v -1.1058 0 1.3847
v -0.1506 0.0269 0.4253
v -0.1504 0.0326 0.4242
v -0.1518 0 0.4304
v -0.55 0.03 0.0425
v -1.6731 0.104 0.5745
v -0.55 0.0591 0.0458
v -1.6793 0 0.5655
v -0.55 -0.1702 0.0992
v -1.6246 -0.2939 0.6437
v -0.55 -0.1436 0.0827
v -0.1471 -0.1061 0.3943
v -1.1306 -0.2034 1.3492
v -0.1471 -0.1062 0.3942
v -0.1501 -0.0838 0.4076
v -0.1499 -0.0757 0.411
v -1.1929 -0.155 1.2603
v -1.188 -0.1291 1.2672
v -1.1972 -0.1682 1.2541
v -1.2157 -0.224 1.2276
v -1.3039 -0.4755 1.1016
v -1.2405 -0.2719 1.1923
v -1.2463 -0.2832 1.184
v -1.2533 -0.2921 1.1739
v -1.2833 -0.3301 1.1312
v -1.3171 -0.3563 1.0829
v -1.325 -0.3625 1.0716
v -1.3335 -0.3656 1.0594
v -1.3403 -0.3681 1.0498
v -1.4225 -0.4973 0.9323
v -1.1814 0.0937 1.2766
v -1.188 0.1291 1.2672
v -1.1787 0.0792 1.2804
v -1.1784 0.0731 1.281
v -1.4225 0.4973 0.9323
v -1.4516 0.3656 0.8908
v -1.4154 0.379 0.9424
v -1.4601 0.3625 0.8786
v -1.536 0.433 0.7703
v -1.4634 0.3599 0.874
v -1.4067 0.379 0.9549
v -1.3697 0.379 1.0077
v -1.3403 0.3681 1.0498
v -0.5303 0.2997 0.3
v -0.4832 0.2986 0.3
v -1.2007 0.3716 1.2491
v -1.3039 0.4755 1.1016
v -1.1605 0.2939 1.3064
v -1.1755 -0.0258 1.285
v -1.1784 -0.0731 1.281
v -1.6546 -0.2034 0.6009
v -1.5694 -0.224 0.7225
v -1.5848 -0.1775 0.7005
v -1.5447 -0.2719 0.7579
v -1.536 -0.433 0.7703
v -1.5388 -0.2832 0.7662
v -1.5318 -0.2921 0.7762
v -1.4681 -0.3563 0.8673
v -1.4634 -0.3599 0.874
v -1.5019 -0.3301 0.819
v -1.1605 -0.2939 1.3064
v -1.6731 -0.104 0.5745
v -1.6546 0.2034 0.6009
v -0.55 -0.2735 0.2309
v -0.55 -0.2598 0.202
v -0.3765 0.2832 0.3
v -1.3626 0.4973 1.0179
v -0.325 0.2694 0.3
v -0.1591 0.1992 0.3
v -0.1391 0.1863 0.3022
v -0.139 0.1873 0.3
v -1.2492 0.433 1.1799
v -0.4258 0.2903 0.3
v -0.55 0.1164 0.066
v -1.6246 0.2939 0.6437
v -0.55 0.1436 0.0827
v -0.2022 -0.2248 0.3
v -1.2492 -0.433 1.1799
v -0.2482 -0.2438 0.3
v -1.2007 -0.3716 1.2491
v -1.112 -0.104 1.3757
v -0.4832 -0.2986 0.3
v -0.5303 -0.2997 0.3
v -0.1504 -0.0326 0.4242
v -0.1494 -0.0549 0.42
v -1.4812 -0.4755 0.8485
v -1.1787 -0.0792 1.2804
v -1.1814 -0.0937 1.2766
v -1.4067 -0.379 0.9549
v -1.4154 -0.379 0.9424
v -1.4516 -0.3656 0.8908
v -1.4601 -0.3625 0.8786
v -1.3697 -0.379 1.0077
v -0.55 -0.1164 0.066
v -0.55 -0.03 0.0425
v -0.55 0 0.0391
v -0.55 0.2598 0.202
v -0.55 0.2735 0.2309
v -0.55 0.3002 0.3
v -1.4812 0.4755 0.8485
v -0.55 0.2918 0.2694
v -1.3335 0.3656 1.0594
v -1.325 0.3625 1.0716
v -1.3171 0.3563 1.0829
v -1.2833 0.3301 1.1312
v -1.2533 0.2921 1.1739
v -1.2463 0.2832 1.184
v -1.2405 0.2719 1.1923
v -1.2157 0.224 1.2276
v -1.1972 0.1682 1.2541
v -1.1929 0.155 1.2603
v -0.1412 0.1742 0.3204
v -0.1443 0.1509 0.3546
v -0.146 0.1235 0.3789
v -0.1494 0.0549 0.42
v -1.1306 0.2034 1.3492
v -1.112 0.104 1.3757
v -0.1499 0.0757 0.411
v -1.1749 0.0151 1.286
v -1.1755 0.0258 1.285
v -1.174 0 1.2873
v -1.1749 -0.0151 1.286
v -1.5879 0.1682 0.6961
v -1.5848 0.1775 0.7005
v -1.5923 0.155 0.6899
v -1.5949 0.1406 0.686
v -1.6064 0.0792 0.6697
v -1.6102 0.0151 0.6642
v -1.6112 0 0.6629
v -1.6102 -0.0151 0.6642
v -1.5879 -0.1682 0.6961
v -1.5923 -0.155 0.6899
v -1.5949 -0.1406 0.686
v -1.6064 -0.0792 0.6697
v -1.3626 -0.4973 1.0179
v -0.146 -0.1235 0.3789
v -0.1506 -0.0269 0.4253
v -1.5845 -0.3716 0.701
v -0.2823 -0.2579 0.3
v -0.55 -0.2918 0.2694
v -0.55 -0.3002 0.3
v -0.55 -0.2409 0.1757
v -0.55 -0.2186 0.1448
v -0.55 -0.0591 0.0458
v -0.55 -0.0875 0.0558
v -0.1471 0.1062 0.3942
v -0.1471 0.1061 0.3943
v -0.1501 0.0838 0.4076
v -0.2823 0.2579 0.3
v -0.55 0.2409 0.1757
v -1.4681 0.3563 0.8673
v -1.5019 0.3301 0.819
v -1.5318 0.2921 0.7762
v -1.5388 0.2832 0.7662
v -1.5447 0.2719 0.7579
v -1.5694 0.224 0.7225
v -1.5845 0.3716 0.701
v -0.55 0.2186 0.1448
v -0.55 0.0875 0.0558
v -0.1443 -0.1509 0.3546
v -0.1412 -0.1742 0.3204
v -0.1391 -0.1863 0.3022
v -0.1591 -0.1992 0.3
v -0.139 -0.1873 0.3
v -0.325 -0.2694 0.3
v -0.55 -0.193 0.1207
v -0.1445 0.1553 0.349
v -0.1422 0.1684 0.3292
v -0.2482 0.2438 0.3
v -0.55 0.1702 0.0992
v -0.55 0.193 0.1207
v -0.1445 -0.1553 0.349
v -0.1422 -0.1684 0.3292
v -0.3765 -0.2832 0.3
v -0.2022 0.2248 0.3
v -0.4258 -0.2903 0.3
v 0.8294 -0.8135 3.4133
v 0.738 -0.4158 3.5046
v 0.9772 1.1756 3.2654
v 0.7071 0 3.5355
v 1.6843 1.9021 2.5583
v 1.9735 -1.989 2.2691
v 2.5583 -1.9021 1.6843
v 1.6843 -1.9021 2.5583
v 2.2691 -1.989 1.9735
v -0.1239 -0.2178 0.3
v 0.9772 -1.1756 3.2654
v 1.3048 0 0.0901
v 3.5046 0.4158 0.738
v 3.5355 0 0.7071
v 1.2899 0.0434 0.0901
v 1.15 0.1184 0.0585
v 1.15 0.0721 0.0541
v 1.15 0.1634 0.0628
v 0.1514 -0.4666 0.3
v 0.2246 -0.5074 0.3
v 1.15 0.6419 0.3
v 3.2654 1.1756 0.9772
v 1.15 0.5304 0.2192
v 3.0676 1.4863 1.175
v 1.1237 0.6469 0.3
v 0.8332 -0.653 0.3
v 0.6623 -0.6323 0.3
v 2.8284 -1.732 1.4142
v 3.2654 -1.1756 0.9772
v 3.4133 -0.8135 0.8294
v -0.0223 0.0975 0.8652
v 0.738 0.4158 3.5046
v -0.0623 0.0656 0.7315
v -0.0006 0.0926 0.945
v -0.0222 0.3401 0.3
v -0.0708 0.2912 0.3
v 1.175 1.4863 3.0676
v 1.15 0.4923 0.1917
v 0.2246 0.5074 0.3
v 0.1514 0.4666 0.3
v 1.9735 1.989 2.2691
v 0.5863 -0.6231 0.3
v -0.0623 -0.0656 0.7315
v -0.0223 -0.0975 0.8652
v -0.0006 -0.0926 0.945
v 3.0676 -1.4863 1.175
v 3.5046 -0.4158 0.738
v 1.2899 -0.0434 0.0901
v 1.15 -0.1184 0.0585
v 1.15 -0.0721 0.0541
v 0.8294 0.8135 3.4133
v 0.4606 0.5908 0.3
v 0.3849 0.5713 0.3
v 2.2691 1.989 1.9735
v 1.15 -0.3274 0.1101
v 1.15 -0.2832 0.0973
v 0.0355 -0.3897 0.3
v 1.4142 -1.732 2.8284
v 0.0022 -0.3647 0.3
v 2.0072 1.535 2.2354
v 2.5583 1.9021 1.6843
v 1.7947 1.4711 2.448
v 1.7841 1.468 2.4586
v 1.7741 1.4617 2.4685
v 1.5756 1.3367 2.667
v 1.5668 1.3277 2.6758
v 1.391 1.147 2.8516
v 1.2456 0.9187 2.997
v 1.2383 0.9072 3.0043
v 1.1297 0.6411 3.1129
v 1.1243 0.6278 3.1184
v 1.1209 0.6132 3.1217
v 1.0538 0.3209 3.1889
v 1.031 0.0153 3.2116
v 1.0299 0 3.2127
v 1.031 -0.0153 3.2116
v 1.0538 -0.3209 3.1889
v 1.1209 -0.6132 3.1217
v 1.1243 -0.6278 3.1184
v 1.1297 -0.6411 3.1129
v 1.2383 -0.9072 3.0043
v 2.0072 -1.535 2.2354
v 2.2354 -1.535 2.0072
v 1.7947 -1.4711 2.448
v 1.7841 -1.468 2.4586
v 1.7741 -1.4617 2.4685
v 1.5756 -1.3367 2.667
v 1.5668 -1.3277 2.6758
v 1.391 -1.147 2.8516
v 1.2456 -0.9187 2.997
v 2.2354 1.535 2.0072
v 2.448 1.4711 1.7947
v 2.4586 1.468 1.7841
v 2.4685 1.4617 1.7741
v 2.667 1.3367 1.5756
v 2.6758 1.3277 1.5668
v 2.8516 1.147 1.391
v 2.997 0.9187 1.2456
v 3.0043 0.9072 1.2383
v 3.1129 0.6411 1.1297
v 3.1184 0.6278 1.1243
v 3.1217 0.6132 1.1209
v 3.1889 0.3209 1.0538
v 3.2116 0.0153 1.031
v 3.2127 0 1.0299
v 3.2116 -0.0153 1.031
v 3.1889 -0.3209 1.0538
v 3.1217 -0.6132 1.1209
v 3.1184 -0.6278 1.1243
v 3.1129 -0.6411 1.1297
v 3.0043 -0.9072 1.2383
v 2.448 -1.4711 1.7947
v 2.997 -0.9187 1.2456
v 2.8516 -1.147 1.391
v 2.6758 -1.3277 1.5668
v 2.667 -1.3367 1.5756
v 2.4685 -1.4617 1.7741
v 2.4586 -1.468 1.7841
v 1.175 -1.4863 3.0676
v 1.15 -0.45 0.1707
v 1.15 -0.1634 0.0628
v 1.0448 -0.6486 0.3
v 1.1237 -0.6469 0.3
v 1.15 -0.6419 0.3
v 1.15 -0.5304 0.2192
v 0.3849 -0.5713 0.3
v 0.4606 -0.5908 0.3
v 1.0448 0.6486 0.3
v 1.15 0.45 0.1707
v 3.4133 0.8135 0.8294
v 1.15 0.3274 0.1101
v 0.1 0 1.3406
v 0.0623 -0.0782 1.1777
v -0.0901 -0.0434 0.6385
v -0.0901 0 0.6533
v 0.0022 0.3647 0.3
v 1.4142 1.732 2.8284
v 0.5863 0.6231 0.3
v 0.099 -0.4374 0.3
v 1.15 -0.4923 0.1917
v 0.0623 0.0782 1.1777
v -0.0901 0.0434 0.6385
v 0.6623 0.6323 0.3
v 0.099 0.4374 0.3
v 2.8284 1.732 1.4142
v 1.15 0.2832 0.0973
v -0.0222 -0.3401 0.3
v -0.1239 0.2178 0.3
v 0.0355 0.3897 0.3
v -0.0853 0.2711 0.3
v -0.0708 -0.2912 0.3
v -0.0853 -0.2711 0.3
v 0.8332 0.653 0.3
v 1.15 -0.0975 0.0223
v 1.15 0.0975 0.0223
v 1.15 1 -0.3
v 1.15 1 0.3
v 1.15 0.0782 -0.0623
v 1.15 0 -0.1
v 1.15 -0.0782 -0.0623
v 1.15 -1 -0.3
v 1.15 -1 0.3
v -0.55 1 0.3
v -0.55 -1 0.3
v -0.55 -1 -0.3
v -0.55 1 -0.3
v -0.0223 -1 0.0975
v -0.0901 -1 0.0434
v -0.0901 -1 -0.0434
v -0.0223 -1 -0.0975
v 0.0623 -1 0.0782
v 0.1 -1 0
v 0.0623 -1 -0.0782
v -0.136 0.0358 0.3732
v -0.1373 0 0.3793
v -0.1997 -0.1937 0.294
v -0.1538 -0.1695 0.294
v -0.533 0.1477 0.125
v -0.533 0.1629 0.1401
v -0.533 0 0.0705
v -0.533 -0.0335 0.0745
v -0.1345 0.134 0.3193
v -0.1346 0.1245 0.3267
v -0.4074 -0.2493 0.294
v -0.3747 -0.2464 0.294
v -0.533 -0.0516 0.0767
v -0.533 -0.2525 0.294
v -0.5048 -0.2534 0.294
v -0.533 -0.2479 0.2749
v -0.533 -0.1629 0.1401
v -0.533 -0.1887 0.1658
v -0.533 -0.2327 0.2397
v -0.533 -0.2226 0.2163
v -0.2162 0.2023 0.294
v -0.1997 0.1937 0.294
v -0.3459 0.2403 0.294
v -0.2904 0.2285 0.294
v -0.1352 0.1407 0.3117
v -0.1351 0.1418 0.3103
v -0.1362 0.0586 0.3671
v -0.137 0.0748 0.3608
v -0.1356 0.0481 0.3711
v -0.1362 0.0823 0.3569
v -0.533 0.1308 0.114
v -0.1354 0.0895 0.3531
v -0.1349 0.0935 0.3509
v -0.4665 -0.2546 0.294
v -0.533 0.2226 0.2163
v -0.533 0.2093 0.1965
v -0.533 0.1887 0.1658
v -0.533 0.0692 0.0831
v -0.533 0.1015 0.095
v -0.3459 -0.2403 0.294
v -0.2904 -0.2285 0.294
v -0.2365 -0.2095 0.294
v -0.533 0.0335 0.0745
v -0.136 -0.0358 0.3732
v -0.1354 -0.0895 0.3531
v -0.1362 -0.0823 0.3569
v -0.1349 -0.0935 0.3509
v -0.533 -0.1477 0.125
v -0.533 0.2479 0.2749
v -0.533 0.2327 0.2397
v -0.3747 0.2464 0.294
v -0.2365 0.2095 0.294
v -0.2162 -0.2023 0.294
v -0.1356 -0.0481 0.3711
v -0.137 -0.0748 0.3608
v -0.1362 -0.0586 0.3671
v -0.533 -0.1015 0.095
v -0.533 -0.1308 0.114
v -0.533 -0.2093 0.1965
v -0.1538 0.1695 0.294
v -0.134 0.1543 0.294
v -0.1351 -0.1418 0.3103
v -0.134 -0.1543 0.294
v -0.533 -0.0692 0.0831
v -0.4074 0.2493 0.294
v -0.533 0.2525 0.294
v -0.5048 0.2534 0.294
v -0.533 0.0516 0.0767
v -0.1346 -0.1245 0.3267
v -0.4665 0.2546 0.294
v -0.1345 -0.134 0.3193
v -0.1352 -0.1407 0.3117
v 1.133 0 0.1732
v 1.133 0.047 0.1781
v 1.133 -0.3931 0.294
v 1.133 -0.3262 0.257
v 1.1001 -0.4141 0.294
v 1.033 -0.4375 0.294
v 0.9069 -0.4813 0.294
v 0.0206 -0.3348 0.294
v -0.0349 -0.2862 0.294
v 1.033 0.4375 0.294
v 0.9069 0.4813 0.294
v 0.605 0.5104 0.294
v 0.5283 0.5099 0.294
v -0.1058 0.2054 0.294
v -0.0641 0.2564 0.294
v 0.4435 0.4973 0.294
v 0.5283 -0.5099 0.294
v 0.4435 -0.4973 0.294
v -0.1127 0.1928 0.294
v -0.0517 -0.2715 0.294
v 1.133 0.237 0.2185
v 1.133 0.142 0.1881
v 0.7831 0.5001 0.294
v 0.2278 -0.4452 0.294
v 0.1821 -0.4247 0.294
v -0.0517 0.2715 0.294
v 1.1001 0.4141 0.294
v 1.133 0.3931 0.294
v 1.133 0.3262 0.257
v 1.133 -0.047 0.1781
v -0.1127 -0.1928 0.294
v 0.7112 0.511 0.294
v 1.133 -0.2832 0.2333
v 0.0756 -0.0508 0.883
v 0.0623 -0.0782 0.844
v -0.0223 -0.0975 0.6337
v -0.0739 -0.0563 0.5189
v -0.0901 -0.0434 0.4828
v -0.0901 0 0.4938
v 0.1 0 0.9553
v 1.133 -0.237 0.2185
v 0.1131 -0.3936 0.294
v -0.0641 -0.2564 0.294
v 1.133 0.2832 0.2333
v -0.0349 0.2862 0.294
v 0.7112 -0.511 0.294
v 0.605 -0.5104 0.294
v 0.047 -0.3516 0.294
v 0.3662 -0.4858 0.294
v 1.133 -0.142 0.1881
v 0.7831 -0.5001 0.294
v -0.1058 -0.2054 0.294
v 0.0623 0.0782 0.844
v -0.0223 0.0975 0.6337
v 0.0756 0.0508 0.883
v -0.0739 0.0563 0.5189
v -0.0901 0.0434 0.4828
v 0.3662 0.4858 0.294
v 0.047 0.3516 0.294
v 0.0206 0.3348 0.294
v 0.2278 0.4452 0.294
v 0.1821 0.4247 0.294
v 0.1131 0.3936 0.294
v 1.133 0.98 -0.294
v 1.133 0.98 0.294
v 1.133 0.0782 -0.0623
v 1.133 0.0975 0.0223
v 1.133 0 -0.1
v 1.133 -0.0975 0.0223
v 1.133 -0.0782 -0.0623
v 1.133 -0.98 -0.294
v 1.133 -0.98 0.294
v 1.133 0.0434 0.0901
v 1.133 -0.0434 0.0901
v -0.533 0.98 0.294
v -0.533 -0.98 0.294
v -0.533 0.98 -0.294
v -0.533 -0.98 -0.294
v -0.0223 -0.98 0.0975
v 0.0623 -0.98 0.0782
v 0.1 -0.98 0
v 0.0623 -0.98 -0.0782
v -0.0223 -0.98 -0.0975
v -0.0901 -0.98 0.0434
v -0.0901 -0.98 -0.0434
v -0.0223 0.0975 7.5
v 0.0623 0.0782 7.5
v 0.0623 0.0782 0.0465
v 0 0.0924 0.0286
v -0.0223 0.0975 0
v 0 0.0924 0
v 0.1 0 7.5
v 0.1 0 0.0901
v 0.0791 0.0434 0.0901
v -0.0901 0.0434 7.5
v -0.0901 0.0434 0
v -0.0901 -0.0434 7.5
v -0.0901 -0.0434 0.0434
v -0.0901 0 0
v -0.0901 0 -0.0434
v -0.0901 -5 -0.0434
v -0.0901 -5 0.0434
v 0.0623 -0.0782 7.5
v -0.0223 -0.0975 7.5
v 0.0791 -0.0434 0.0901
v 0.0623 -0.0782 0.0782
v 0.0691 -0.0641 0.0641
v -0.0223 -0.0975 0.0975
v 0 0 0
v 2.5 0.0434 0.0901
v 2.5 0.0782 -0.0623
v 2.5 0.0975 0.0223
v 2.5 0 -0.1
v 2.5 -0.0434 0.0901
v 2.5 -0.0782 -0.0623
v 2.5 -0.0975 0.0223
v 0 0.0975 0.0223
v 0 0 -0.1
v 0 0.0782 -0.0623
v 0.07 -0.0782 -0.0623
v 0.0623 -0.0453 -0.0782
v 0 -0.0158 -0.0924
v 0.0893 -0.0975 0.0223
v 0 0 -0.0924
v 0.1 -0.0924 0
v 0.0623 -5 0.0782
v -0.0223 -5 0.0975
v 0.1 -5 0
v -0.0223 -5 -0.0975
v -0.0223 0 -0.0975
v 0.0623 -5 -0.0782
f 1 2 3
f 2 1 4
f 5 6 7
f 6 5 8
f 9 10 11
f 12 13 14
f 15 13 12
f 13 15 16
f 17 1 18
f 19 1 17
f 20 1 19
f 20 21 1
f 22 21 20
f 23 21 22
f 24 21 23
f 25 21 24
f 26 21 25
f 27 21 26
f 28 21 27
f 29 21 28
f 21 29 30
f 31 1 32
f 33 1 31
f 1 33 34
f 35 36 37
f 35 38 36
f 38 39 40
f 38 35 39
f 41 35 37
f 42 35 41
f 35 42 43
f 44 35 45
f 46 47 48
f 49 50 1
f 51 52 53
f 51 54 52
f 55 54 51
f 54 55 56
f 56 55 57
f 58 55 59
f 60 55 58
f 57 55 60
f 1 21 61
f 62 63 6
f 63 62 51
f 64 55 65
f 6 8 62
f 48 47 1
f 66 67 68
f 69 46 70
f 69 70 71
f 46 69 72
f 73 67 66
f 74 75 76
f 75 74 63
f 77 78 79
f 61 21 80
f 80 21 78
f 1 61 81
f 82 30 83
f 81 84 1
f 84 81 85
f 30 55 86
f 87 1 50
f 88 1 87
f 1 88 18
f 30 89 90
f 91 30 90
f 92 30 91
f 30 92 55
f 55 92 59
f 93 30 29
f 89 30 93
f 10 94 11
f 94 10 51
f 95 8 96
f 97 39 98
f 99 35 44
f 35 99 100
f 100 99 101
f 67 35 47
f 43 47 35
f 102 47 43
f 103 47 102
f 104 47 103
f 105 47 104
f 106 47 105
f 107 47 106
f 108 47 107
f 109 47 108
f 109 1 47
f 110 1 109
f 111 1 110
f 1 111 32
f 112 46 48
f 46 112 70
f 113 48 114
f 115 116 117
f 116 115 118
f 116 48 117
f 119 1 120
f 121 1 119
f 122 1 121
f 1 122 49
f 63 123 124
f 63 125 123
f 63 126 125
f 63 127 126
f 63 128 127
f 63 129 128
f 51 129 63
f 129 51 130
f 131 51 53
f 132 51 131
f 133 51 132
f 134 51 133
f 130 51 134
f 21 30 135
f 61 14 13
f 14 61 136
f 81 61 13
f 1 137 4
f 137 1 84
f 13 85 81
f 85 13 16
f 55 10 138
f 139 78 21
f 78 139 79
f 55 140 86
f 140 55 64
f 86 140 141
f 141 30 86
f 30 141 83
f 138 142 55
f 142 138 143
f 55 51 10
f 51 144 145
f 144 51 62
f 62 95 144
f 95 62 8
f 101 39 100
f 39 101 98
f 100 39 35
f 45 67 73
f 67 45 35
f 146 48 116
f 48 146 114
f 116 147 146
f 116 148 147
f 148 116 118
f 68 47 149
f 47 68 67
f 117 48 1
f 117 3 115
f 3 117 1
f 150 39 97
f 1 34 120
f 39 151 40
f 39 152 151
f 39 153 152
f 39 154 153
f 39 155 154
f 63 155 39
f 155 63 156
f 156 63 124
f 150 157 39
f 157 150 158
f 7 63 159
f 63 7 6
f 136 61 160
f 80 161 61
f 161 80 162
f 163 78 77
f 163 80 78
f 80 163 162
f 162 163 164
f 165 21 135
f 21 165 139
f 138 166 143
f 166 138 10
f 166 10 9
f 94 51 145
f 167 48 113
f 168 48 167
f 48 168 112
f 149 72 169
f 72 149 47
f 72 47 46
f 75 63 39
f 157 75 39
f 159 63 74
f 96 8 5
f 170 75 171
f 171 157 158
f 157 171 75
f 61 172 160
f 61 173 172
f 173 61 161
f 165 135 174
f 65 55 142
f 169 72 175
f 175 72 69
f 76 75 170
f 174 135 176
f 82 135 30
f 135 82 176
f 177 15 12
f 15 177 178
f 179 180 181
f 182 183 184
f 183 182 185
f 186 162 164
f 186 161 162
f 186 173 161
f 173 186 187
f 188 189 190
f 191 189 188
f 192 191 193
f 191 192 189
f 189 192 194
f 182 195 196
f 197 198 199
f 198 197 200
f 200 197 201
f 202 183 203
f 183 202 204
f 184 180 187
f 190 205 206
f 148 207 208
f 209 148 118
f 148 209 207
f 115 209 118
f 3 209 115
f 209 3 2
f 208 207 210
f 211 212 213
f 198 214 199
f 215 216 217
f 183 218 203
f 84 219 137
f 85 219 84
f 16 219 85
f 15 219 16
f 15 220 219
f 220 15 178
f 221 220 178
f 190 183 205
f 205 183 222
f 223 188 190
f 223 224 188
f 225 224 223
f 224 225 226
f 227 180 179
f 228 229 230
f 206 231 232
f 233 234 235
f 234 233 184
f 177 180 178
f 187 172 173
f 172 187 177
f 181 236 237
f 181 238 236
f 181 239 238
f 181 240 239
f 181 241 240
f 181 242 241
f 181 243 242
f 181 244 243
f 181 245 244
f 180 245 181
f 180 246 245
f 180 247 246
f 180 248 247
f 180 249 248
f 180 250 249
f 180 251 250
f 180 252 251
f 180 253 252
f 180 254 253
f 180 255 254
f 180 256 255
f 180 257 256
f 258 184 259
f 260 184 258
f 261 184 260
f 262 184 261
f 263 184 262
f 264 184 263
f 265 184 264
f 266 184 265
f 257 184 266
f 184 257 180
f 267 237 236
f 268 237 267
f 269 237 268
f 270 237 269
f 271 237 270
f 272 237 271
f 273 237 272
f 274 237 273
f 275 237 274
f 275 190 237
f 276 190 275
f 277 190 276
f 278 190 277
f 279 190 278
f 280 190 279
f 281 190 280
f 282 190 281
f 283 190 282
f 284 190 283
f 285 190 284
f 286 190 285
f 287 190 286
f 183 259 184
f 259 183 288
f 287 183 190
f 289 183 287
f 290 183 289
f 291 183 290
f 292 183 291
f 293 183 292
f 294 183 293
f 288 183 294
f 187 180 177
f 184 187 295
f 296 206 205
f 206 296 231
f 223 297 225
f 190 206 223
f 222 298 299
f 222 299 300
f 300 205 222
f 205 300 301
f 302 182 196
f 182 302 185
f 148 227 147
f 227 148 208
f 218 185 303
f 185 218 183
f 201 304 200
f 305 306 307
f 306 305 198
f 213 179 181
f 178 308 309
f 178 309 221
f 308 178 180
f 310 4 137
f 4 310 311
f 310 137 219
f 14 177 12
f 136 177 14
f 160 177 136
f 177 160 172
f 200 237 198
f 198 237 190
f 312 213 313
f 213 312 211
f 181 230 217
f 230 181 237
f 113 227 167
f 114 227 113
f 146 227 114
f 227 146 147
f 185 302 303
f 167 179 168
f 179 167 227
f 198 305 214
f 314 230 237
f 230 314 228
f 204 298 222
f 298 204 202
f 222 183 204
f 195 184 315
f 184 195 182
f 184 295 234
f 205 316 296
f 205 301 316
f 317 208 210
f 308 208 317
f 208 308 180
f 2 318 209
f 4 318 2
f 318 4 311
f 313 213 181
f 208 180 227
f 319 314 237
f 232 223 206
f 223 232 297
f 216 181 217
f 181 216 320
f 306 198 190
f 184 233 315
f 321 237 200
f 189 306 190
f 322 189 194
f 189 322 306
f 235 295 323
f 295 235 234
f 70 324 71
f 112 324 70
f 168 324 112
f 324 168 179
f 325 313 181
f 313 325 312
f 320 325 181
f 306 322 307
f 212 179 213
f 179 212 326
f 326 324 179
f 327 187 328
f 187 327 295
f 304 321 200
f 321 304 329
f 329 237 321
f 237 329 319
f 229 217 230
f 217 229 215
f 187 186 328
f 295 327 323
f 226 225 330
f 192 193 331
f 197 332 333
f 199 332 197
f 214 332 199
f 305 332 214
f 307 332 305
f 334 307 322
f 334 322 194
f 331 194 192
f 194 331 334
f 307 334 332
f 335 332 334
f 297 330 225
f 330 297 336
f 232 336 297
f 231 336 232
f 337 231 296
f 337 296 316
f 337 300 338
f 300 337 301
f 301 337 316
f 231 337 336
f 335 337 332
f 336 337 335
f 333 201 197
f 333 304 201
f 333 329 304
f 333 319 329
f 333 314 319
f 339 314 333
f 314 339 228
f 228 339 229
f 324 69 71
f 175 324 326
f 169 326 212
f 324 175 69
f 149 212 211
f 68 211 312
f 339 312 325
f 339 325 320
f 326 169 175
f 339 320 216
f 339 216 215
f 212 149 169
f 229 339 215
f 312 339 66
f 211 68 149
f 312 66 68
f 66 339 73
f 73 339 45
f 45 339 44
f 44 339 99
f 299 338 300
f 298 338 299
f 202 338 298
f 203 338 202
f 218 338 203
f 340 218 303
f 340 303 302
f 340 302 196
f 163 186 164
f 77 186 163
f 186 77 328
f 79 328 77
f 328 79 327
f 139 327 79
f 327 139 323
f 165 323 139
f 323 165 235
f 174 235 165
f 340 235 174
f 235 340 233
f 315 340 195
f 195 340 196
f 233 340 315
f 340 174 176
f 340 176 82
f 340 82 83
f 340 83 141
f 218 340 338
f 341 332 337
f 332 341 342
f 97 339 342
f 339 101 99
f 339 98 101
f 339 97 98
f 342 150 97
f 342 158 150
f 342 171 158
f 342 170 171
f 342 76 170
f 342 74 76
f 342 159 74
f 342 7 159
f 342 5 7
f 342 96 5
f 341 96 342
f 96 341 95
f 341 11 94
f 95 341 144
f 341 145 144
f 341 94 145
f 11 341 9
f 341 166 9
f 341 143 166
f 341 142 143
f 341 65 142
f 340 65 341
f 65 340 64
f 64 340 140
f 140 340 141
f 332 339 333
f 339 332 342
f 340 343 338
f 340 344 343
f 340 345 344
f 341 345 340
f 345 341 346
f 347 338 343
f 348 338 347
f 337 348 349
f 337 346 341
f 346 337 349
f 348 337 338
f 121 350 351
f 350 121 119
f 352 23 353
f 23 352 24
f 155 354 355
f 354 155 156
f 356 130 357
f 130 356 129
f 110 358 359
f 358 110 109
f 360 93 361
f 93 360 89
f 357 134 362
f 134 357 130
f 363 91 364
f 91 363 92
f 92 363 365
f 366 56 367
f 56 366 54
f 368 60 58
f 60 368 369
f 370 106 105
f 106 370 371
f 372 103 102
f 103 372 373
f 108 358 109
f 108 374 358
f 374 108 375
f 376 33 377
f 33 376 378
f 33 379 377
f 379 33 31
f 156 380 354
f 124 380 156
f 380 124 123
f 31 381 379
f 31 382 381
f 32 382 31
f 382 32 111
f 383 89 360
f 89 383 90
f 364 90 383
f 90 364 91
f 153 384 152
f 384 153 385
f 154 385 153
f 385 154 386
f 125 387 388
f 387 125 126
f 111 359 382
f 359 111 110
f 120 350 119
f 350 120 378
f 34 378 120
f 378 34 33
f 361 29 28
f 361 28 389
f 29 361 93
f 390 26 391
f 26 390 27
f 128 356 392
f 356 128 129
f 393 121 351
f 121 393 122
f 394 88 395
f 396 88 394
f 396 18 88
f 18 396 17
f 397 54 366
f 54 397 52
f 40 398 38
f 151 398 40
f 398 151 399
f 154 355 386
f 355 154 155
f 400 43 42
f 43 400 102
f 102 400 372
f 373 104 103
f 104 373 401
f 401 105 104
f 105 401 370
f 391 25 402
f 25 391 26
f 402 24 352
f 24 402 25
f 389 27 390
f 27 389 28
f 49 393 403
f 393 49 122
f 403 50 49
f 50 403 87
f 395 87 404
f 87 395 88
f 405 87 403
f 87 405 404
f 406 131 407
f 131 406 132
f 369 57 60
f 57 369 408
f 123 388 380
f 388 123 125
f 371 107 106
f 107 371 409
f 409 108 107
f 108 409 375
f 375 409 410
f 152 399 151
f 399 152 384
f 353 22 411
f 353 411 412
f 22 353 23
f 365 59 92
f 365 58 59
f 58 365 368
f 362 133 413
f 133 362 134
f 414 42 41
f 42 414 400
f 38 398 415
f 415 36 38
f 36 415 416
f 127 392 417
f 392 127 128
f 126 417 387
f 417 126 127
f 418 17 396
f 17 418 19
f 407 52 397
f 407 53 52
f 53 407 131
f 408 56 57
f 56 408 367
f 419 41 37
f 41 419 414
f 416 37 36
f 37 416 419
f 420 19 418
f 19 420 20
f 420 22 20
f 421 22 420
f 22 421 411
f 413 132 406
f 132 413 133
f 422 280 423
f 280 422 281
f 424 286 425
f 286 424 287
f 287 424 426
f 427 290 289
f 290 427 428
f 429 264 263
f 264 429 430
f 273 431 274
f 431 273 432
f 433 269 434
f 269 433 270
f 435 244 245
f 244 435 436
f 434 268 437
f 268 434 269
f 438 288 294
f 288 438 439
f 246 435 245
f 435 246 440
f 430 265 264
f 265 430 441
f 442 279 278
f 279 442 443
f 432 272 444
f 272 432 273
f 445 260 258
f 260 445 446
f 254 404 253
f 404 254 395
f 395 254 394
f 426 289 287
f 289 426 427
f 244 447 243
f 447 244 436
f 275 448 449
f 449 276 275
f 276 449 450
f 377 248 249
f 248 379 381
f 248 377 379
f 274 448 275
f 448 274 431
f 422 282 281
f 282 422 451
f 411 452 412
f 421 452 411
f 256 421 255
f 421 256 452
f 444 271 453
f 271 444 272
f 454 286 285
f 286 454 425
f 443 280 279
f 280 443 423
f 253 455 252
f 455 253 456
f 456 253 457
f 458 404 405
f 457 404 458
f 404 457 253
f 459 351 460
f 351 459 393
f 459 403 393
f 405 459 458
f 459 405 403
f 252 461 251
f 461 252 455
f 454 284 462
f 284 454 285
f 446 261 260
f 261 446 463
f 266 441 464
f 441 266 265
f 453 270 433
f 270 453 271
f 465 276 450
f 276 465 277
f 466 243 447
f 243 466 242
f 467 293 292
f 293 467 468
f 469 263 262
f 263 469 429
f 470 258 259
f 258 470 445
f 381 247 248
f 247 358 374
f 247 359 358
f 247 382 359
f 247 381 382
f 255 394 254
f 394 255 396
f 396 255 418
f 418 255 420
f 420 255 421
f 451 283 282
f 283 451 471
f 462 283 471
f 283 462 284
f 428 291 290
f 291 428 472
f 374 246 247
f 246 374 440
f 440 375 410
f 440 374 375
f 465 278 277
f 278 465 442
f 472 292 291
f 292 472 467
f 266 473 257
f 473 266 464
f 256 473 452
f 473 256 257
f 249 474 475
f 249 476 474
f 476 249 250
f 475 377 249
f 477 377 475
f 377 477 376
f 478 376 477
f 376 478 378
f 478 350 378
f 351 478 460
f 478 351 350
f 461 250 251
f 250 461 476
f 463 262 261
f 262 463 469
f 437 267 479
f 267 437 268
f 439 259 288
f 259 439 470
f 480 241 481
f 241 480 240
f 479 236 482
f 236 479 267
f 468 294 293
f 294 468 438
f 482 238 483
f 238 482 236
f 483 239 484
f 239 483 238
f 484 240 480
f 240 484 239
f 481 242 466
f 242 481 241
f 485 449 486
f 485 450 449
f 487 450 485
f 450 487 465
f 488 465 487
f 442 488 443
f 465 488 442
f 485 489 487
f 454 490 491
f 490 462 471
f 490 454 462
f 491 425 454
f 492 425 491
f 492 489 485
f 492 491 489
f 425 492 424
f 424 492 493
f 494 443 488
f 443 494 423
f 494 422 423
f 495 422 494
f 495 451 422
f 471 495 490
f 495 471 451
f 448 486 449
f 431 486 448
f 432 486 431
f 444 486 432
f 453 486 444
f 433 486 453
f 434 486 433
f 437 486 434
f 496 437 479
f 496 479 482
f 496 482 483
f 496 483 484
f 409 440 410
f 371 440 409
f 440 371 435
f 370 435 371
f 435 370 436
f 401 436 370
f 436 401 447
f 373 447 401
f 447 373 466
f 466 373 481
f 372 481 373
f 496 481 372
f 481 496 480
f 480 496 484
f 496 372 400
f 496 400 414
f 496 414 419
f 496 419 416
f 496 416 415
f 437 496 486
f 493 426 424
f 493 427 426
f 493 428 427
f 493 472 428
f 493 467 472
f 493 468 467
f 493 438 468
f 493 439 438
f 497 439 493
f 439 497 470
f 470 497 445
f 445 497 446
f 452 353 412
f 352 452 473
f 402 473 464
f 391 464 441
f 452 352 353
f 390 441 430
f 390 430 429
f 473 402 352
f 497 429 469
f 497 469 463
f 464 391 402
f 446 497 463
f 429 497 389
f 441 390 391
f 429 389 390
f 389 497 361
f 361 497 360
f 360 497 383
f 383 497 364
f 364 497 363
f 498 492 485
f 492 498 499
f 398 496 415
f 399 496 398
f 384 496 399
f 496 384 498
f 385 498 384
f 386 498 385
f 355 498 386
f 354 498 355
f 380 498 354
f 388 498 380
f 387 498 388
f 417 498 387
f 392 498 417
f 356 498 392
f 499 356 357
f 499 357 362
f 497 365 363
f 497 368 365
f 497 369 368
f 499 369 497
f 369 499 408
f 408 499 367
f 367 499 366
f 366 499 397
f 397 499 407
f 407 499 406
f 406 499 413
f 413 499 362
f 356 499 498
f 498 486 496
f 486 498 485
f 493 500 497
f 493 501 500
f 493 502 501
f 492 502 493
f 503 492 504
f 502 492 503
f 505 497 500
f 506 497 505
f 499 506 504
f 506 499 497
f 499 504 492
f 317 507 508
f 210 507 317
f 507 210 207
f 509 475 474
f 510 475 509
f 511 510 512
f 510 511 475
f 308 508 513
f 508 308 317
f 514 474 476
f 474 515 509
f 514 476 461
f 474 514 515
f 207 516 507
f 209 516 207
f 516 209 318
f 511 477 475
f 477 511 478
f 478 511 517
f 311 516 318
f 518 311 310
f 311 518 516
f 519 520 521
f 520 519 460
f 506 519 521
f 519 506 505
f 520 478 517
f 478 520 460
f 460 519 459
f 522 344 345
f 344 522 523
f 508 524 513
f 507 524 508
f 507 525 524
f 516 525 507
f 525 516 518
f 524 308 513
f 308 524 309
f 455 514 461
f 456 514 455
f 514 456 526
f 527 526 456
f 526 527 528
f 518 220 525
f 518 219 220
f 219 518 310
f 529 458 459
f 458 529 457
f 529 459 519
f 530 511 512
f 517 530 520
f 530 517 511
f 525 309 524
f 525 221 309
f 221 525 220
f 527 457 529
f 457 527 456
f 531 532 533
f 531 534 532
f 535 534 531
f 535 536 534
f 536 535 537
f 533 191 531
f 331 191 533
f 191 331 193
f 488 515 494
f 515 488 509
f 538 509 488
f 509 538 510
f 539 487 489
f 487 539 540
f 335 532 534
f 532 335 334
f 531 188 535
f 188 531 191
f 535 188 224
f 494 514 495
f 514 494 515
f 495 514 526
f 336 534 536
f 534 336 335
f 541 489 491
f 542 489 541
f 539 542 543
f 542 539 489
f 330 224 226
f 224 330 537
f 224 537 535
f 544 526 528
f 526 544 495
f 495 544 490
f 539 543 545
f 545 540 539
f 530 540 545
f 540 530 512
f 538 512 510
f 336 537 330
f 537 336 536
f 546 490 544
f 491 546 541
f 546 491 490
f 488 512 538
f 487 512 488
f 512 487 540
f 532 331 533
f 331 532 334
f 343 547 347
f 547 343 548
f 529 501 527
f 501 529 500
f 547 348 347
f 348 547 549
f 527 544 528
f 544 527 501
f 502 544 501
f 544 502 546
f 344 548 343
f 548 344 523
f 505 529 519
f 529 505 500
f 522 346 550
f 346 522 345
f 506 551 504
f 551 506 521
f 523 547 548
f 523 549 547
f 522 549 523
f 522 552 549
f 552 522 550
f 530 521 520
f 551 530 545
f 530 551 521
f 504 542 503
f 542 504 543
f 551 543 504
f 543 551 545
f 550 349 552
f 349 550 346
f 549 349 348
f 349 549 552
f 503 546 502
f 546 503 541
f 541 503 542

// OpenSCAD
// Gramaphone like surface

sphere_w=1;
sphere_inner_w=.98;
sphere_cnt=6;
sphere_offset=.7;
$fs=.1;


//z
color([.1,.1,.5])
cylinder(r=.1,h=7.5);
// x

color([.5,.1,.1])
rotate([0,90,0]) cylinder(r=.1,h=2.5);
// y

color([.1,.5,.1])
rotate([90,0]) cylinder(r=.1,h=5);



module outer(w){
 for(i=[0:sphere_cnt]){
  rotate([0,0,i*360/sphere_cnt])
  translate([w*sphere_offset,0,0])
  sphere(w);
 }
}

module test(){
scale([1,1,2])
difference(){
 outer(sphere_w);
 translate([0,0,.5]) scale([1.1,1.1,1])
 outer(sphere_w*sphere_inner_w);
}
 translate([0,0,-3.5])
 cylinder(r1=.5,r2=1.5,h=3);
}

mic_h=1.7;
mic_r1=.2;
mic_r2=.5;
mic_rot=[0,-55,0];

speak_h=3;
speak_r1=.3;
speak_r2=2;
speak_rot=[0,45,0];
base_x=1.7;
base_y=2;
baze_z=.6;
base_trans=[.3,0,0];

module test2(){
difference(){
  union(){
  rotate(mic_rot)
  cylinder(r1=mic_r1, r2=mic_r2,h=mic_h);
  rotate(speak_rot)
  cylinder(r1=speak_r1, r2=speak_r2,h=speak_h);
  translate(base_trans)
  cube([base_x,base_y,baze_z],center=true);
  }

  union(){ 
   rotate(mic_rot)
    cylinder(r1=mic_r1*sphere_inner_w, r2=mic_r2*sphere_inner_w,h=mic_h+1);
  rotate(speak_rot)
  cylinder(r1=speak_r1*sphere_inner_w, r2=speak_r2*sphere_inner_w,h=speak_h+1);
  translate(base_trans)
  cube([base_x*sphere_inner_w,base_y*sphere_inner_w,baze_z*sphere_inner_w],center=true);
  }
}
}

test2();
